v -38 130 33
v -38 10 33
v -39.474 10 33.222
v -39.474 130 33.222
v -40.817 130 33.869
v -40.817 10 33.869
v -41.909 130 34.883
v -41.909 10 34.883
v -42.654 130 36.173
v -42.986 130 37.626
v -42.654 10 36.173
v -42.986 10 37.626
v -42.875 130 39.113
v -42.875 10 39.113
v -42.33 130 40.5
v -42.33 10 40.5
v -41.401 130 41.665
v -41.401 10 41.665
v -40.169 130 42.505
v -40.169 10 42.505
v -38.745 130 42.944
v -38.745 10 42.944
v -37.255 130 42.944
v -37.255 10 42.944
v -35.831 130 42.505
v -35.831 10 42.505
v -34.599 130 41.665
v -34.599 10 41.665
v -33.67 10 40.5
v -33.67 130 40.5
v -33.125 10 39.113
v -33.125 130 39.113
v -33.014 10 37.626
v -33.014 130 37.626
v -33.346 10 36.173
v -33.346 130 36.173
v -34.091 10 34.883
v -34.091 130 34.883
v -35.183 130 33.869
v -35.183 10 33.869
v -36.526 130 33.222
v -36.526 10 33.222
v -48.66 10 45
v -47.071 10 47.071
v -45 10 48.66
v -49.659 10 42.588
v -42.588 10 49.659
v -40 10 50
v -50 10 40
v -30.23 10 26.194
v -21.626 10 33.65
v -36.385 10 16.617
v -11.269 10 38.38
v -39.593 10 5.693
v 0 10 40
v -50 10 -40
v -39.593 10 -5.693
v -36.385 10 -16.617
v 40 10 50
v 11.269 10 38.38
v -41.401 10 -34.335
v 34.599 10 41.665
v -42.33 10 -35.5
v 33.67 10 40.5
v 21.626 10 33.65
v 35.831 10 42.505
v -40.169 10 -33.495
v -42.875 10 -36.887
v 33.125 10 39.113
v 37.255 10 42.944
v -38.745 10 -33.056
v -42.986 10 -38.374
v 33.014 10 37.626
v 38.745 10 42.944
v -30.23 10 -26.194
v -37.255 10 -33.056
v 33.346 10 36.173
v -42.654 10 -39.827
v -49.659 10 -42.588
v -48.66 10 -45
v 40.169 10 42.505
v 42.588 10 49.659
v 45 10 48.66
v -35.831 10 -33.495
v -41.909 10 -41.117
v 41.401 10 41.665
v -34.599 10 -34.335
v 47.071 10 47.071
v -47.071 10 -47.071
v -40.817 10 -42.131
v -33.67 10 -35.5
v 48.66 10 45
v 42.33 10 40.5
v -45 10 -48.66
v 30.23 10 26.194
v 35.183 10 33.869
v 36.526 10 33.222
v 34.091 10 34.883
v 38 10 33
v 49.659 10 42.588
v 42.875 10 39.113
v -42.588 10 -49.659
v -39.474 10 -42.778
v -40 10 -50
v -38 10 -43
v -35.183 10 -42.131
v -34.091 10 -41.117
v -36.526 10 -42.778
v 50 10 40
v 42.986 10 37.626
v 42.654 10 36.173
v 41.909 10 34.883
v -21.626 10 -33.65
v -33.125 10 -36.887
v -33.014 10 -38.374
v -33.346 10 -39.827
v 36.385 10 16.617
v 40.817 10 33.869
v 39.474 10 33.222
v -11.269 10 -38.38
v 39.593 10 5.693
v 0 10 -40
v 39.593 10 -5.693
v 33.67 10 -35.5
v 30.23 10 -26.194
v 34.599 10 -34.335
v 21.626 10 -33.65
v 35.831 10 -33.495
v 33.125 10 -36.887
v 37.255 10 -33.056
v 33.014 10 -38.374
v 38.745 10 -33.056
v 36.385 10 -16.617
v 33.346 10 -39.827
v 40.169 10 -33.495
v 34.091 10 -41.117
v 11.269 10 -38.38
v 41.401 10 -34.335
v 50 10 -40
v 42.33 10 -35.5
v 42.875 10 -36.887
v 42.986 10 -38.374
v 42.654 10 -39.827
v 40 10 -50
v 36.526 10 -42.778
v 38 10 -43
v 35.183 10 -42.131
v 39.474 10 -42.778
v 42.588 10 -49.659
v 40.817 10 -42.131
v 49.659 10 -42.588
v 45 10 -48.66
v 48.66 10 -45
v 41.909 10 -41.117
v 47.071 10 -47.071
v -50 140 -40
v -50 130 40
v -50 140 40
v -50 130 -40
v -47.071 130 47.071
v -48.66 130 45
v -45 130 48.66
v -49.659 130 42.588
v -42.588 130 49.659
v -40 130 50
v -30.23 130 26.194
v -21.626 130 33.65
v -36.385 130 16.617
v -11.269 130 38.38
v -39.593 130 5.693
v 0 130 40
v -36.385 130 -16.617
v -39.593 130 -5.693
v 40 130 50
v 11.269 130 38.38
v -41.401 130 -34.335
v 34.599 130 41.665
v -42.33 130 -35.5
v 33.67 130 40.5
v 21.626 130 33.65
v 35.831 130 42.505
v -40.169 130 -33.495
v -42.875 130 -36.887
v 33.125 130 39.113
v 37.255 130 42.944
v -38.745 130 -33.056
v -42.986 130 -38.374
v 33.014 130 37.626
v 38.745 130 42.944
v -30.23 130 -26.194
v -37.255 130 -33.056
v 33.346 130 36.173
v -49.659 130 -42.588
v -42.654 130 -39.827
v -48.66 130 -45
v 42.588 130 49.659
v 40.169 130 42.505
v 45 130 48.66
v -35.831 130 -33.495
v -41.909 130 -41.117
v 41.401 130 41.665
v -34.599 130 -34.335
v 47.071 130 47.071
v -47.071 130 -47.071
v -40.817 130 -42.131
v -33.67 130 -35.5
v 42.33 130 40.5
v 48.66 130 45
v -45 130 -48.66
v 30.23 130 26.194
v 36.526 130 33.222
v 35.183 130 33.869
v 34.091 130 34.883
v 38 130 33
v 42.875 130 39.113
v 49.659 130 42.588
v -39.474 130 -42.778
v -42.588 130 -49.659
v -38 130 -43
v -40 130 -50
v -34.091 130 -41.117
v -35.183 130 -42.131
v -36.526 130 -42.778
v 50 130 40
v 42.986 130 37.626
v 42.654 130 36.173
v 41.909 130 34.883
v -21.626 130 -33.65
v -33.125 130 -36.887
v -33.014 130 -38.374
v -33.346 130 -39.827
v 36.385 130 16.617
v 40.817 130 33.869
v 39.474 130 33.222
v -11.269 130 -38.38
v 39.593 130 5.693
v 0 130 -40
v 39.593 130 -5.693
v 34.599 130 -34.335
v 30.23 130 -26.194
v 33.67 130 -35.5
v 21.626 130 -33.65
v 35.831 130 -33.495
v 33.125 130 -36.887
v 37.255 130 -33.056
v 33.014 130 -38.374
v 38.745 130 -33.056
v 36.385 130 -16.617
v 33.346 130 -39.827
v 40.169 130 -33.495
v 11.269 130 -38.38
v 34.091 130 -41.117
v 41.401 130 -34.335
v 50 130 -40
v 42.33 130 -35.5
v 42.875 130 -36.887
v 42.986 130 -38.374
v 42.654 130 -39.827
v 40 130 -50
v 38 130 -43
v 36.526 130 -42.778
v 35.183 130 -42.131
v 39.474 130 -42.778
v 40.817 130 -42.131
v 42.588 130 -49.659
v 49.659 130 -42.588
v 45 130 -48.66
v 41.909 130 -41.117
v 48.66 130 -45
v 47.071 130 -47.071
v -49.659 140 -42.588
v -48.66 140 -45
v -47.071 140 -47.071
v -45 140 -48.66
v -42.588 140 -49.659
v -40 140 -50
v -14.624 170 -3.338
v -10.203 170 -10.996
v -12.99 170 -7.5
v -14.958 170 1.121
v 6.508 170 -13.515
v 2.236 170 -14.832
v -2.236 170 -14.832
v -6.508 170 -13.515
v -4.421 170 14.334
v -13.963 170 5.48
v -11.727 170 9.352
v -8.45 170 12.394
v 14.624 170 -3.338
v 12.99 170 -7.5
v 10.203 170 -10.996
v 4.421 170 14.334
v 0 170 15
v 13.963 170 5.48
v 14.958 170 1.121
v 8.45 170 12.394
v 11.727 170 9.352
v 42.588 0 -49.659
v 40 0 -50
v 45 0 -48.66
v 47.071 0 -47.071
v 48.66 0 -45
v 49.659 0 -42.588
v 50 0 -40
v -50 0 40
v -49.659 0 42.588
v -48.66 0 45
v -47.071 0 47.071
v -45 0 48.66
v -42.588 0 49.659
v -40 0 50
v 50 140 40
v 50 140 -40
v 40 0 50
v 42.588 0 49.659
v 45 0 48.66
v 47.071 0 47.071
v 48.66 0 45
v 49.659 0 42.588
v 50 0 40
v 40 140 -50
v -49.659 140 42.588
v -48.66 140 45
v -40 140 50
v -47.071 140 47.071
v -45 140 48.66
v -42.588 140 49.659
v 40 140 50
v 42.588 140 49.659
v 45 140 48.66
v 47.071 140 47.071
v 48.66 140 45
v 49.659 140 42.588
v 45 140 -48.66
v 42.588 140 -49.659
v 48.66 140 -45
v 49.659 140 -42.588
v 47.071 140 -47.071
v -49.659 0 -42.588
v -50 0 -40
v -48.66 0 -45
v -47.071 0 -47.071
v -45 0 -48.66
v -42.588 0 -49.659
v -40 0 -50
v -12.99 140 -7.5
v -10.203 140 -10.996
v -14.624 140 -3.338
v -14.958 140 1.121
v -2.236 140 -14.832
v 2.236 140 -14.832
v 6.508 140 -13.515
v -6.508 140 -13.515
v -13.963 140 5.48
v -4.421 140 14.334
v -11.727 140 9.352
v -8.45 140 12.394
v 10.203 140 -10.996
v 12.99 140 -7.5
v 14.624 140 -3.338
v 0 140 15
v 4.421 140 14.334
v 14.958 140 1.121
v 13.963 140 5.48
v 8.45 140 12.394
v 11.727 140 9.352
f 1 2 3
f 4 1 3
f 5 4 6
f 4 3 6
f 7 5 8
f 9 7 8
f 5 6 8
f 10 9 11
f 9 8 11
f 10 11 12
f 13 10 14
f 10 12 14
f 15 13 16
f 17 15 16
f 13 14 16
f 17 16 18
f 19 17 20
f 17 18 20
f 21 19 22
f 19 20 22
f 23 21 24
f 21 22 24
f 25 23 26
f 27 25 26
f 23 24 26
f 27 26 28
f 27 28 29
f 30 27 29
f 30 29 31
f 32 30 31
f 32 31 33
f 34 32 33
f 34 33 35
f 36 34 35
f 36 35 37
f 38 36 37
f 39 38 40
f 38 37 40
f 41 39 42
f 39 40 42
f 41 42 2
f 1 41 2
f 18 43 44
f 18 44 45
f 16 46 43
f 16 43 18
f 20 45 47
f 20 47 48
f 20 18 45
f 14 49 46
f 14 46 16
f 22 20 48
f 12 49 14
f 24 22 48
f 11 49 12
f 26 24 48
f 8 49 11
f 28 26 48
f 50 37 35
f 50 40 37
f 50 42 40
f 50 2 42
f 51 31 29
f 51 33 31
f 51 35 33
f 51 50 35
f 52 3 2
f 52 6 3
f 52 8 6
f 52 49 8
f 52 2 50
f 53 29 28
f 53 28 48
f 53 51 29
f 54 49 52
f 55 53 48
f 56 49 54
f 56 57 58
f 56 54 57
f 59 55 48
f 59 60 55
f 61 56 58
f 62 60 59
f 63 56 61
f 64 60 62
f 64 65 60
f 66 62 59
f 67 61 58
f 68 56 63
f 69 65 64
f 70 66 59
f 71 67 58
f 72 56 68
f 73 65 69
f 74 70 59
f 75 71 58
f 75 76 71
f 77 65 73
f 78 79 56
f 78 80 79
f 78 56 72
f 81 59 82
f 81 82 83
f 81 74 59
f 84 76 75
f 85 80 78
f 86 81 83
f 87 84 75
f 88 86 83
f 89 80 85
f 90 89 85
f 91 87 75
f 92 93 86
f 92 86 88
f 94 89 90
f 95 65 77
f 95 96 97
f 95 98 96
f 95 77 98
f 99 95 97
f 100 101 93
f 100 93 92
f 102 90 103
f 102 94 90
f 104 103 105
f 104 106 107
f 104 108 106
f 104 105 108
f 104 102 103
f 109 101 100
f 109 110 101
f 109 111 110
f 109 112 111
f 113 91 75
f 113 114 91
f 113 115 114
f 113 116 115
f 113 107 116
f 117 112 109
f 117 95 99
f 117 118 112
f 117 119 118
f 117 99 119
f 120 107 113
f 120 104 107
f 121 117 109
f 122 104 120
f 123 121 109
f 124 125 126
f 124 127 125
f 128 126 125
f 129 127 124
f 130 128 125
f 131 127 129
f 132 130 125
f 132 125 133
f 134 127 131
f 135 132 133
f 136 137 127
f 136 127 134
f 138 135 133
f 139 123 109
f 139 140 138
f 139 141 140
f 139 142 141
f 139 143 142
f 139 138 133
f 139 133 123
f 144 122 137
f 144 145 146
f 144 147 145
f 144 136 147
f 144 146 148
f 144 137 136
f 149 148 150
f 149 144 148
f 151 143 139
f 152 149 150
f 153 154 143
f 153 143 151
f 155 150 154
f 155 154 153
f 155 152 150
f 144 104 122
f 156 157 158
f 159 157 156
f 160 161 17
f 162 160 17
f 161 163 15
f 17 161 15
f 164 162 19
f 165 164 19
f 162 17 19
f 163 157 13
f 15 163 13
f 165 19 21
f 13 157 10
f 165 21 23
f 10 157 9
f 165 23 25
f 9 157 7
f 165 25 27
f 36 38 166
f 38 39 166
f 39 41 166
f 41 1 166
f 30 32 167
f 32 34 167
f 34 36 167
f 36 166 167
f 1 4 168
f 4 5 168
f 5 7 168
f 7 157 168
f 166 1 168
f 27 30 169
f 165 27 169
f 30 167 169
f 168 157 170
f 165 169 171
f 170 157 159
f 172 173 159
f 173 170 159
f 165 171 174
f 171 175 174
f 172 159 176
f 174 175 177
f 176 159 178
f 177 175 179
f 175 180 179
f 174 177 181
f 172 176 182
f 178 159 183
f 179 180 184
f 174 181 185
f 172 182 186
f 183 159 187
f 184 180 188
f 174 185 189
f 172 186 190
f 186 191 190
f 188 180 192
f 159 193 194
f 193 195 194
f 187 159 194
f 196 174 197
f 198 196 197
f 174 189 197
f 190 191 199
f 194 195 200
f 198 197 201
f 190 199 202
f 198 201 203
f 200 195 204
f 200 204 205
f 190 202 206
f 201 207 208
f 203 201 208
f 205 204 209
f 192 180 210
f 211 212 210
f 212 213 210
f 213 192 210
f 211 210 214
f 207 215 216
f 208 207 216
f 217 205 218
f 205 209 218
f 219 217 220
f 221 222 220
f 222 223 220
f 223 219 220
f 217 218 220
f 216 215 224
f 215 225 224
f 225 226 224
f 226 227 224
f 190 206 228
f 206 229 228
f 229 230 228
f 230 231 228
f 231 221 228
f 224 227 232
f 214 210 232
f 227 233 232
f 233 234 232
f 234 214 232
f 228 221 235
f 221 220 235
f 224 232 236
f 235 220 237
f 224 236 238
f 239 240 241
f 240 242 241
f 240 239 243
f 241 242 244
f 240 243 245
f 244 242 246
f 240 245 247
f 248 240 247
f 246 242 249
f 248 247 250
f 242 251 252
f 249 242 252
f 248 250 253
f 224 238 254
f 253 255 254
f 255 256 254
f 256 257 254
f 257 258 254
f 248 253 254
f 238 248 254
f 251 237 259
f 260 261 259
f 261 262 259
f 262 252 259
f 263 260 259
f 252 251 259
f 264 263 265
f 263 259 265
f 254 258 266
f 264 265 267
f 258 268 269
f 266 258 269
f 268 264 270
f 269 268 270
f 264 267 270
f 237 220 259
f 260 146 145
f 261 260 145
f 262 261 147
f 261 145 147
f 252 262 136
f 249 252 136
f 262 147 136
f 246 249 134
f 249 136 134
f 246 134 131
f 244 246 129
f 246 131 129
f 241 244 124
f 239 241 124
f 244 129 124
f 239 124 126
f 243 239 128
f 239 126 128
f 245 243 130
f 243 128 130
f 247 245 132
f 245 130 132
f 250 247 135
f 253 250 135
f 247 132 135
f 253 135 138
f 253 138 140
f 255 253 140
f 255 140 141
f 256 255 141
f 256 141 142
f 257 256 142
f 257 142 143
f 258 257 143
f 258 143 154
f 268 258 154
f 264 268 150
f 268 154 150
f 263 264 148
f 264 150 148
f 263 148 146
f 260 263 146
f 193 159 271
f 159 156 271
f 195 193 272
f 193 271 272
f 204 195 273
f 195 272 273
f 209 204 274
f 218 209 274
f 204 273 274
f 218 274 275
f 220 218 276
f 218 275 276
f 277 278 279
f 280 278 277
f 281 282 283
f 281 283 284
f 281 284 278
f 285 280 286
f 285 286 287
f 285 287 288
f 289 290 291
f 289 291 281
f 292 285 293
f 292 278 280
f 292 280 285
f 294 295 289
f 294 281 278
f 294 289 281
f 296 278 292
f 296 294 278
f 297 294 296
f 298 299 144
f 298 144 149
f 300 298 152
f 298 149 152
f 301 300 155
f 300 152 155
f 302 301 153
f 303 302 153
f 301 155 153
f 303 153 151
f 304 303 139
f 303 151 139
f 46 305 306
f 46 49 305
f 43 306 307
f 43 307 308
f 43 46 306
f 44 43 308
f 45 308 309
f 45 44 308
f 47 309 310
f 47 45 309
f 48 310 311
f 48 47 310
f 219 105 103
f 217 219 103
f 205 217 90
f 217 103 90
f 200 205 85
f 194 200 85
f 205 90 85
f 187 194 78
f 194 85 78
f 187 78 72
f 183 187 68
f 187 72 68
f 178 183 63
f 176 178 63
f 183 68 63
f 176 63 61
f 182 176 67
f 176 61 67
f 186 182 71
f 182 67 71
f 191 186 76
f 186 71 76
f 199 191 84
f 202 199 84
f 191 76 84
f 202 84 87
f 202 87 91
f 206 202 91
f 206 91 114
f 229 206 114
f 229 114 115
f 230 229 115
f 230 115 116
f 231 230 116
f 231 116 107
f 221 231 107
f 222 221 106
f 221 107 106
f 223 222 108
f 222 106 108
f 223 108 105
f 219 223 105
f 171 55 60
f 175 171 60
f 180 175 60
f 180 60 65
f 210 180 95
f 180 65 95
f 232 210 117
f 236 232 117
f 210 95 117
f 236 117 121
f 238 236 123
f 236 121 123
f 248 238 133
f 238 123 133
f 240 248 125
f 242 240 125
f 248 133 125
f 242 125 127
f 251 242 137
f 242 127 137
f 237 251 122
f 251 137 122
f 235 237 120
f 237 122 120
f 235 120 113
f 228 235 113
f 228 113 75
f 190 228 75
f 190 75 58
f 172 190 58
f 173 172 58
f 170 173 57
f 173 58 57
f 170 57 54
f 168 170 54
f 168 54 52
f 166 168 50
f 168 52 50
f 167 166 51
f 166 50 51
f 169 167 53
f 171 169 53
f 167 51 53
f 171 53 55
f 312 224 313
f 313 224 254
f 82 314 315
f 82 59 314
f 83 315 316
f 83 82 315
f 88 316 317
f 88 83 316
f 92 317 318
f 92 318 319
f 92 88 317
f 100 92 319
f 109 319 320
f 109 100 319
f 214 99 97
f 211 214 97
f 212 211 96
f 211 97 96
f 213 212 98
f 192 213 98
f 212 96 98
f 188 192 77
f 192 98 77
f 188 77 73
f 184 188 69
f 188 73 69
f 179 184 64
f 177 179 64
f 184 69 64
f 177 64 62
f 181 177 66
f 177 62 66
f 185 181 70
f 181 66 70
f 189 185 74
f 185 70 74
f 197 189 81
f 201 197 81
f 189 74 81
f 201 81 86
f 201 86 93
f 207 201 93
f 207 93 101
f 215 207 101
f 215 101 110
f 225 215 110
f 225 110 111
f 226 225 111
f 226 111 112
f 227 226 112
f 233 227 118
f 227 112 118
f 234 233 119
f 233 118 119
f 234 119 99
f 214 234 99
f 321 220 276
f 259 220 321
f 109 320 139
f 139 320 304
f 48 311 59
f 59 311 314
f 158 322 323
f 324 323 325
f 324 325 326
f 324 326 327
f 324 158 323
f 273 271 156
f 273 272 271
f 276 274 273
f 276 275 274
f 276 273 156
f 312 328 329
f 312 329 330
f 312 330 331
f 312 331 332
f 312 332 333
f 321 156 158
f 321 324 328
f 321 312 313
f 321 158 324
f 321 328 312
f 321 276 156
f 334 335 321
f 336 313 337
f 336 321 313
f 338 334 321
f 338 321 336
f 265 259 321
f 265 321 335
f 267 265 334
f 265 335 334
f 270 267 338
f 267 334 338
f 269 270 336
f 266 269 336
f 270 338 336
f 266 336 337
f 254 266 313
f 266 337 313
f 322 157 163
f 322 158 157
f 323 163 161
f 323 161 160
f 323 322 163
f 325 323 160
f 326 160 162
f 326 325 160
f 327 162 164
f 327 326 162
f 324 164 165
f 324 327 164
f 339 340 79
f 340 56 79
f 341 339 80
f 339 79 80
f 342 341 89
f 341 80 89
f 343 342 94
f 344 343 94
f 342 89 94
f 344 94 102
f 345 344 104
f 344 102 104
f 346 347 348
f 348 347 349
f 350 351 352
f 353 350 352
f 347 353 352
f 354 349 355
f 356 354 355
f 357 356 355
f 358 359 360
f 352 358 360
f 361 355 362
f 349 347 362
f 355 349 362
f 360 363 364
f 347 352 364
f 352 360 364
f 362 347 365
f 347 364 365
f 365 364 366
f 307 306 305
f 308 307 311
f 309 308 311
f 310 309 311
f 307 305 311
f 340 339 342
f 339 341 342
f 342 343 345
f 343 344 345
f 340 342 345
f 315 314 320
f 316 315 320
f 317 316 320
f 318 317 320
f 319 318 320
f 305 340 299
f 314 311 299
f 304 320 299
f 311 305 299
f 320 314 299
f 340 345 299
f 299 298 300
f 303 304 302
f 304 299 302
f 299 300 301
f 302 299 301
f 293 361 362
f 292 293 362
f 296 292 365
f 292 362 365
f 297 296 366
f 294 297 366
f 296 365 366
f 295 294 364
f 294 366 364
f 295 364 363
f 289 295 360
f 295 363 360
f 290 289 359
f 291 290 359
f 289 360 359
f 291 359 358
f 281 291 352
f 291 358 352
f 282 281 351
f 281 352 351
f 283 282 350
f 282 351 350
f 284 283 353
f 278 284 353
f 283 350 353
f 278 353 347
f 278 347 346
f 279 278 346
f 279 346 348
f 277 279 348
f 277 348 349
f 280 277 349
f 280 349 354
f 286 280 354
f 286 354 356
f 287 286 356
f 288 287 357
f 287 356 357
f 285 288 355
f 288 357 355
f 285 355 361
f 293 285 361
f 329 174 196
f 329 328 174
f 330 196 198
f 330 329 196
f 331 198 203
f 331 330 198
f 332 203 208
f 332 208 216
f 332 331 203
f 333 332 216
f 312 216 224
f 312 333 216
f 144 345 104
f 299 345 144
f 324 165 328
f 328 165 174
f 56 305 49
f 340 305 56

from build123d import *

# Parameters (mm, degrees)
SKETCH1_W           = 100
SKETCH1_H           = 100
BOSS_EXTRUDE1_DEPTH = 10
SKETCH2_R           = 40
BOSS_EXTRUDE2_DEPTH = 120
SKETCH3_W           = 100
SKETCH3_H           = 100
BOSS_EXTRUDE3_DEPTH = 10
SKETCH4_R           = 15
BOSS_EXTRUDE4_DEPTH = 30
SKETCH5_R           = 5
BOSS_EXTRUDE5_DEPTH = 120
FILLET1_R           = 10


with BuildPart() as part:
    # Sketch1 → Boss-Extrude1 (new body)
    with BuildSketch(Plane(origin=(0, 0, 0), x_dir=(1, 0, 0), z_dir=(0, 1, 0))):
        Rectangle(SKETCH1_W, SKETCH1_H)
    extrude(amount=BOSS_EXTRUDE1_DEPTH)



with BuildPart() as body_2:
    # Sketch2 → Boss-Extrude2 (new body)
    with BuildSketch(Plane(origin=(0, 10, 0), x_dir=(1, 0, 0), z_dir=(0, 1, 0))):
        with Locations(Location((0, 0, 0), (0, 0, 270))):
            Circle(SKETCH2_R)
    extrude(amount=BOSS_EXTRUDE2_DEPTH)


with BuildPart() as body_3:
    # Sketch3 → Boss-Extrude3 (new body)
    with BuildSketch(Plane(origin=(0, 130, 0), x_dir=(1, 0, 0), z_dir=(0, 1, 0))):
        Rectangle(SKETCH3_W, SKETCH3_H)
    extrude(amount=BOSS_EXTRUDE3_DEPTH)


with BuildPart() as body_4:
    # Sketch4 → Boss-Extrude4 (new body)
    with BuildSketch(Plane(origin=(0, 140, 0), x_dir=(1, 0, 0), z_dir=(0, 1, 0))):
        with Locations(Location((0, 0, 0), (0, 0, 270))):
            Circle(SKETCH4_R)
    extrude(amount=BOSS_EXTRUDE4_DEPTH)


with BuildPart() as part_1:
    add(part.part)

    add(body_2.part)  # Boss-Extrude5 merges body 2

    add(body_3.part)  # Boss-Extrude5 merges body 3
    # Sketch5 → Boss-Extrude5 (add)
    with BuildSketch(Plane(origin=(0, 10, 0), x_dir=(1, 0, 0), z_dir=(0, 1, 0))):
        with Locations(Location((-38, 38, 0), (0, 0, 90))):
            Circle(SKETCH5_R)
        with Locations(Location((38, 38, 0), (0, 0, 90))):
            Circle(SKETCH5_R)
        with Locations(Location((38, -38, 0), (0, 0, 90))):
            Circle(SKETCH5_R)
        with Locations(Location((-38, -38, 0), (0, 0, 90))):
            Circle(SKETCH5_R)
    extrude(amount=BOSS_EXTRUDE5_DEPTH)

    # Fillet1
    fillet1_edges = [part_1.edges().sort_by_distance(p)[0] for p in [
        (-50, 135, -50),
        (-50, 135, 50),
        (50, 135, 50),
        (50, 135, -50),
        (50, 5, 50),
        (-50, 5, 50),
        (-50, 5, -50),
        (50, 5, -50),
    ]]
    fillet(fillet1_edges, radius=FILLET1_R)


solid = Compound([body_4.part, part_1.part])
